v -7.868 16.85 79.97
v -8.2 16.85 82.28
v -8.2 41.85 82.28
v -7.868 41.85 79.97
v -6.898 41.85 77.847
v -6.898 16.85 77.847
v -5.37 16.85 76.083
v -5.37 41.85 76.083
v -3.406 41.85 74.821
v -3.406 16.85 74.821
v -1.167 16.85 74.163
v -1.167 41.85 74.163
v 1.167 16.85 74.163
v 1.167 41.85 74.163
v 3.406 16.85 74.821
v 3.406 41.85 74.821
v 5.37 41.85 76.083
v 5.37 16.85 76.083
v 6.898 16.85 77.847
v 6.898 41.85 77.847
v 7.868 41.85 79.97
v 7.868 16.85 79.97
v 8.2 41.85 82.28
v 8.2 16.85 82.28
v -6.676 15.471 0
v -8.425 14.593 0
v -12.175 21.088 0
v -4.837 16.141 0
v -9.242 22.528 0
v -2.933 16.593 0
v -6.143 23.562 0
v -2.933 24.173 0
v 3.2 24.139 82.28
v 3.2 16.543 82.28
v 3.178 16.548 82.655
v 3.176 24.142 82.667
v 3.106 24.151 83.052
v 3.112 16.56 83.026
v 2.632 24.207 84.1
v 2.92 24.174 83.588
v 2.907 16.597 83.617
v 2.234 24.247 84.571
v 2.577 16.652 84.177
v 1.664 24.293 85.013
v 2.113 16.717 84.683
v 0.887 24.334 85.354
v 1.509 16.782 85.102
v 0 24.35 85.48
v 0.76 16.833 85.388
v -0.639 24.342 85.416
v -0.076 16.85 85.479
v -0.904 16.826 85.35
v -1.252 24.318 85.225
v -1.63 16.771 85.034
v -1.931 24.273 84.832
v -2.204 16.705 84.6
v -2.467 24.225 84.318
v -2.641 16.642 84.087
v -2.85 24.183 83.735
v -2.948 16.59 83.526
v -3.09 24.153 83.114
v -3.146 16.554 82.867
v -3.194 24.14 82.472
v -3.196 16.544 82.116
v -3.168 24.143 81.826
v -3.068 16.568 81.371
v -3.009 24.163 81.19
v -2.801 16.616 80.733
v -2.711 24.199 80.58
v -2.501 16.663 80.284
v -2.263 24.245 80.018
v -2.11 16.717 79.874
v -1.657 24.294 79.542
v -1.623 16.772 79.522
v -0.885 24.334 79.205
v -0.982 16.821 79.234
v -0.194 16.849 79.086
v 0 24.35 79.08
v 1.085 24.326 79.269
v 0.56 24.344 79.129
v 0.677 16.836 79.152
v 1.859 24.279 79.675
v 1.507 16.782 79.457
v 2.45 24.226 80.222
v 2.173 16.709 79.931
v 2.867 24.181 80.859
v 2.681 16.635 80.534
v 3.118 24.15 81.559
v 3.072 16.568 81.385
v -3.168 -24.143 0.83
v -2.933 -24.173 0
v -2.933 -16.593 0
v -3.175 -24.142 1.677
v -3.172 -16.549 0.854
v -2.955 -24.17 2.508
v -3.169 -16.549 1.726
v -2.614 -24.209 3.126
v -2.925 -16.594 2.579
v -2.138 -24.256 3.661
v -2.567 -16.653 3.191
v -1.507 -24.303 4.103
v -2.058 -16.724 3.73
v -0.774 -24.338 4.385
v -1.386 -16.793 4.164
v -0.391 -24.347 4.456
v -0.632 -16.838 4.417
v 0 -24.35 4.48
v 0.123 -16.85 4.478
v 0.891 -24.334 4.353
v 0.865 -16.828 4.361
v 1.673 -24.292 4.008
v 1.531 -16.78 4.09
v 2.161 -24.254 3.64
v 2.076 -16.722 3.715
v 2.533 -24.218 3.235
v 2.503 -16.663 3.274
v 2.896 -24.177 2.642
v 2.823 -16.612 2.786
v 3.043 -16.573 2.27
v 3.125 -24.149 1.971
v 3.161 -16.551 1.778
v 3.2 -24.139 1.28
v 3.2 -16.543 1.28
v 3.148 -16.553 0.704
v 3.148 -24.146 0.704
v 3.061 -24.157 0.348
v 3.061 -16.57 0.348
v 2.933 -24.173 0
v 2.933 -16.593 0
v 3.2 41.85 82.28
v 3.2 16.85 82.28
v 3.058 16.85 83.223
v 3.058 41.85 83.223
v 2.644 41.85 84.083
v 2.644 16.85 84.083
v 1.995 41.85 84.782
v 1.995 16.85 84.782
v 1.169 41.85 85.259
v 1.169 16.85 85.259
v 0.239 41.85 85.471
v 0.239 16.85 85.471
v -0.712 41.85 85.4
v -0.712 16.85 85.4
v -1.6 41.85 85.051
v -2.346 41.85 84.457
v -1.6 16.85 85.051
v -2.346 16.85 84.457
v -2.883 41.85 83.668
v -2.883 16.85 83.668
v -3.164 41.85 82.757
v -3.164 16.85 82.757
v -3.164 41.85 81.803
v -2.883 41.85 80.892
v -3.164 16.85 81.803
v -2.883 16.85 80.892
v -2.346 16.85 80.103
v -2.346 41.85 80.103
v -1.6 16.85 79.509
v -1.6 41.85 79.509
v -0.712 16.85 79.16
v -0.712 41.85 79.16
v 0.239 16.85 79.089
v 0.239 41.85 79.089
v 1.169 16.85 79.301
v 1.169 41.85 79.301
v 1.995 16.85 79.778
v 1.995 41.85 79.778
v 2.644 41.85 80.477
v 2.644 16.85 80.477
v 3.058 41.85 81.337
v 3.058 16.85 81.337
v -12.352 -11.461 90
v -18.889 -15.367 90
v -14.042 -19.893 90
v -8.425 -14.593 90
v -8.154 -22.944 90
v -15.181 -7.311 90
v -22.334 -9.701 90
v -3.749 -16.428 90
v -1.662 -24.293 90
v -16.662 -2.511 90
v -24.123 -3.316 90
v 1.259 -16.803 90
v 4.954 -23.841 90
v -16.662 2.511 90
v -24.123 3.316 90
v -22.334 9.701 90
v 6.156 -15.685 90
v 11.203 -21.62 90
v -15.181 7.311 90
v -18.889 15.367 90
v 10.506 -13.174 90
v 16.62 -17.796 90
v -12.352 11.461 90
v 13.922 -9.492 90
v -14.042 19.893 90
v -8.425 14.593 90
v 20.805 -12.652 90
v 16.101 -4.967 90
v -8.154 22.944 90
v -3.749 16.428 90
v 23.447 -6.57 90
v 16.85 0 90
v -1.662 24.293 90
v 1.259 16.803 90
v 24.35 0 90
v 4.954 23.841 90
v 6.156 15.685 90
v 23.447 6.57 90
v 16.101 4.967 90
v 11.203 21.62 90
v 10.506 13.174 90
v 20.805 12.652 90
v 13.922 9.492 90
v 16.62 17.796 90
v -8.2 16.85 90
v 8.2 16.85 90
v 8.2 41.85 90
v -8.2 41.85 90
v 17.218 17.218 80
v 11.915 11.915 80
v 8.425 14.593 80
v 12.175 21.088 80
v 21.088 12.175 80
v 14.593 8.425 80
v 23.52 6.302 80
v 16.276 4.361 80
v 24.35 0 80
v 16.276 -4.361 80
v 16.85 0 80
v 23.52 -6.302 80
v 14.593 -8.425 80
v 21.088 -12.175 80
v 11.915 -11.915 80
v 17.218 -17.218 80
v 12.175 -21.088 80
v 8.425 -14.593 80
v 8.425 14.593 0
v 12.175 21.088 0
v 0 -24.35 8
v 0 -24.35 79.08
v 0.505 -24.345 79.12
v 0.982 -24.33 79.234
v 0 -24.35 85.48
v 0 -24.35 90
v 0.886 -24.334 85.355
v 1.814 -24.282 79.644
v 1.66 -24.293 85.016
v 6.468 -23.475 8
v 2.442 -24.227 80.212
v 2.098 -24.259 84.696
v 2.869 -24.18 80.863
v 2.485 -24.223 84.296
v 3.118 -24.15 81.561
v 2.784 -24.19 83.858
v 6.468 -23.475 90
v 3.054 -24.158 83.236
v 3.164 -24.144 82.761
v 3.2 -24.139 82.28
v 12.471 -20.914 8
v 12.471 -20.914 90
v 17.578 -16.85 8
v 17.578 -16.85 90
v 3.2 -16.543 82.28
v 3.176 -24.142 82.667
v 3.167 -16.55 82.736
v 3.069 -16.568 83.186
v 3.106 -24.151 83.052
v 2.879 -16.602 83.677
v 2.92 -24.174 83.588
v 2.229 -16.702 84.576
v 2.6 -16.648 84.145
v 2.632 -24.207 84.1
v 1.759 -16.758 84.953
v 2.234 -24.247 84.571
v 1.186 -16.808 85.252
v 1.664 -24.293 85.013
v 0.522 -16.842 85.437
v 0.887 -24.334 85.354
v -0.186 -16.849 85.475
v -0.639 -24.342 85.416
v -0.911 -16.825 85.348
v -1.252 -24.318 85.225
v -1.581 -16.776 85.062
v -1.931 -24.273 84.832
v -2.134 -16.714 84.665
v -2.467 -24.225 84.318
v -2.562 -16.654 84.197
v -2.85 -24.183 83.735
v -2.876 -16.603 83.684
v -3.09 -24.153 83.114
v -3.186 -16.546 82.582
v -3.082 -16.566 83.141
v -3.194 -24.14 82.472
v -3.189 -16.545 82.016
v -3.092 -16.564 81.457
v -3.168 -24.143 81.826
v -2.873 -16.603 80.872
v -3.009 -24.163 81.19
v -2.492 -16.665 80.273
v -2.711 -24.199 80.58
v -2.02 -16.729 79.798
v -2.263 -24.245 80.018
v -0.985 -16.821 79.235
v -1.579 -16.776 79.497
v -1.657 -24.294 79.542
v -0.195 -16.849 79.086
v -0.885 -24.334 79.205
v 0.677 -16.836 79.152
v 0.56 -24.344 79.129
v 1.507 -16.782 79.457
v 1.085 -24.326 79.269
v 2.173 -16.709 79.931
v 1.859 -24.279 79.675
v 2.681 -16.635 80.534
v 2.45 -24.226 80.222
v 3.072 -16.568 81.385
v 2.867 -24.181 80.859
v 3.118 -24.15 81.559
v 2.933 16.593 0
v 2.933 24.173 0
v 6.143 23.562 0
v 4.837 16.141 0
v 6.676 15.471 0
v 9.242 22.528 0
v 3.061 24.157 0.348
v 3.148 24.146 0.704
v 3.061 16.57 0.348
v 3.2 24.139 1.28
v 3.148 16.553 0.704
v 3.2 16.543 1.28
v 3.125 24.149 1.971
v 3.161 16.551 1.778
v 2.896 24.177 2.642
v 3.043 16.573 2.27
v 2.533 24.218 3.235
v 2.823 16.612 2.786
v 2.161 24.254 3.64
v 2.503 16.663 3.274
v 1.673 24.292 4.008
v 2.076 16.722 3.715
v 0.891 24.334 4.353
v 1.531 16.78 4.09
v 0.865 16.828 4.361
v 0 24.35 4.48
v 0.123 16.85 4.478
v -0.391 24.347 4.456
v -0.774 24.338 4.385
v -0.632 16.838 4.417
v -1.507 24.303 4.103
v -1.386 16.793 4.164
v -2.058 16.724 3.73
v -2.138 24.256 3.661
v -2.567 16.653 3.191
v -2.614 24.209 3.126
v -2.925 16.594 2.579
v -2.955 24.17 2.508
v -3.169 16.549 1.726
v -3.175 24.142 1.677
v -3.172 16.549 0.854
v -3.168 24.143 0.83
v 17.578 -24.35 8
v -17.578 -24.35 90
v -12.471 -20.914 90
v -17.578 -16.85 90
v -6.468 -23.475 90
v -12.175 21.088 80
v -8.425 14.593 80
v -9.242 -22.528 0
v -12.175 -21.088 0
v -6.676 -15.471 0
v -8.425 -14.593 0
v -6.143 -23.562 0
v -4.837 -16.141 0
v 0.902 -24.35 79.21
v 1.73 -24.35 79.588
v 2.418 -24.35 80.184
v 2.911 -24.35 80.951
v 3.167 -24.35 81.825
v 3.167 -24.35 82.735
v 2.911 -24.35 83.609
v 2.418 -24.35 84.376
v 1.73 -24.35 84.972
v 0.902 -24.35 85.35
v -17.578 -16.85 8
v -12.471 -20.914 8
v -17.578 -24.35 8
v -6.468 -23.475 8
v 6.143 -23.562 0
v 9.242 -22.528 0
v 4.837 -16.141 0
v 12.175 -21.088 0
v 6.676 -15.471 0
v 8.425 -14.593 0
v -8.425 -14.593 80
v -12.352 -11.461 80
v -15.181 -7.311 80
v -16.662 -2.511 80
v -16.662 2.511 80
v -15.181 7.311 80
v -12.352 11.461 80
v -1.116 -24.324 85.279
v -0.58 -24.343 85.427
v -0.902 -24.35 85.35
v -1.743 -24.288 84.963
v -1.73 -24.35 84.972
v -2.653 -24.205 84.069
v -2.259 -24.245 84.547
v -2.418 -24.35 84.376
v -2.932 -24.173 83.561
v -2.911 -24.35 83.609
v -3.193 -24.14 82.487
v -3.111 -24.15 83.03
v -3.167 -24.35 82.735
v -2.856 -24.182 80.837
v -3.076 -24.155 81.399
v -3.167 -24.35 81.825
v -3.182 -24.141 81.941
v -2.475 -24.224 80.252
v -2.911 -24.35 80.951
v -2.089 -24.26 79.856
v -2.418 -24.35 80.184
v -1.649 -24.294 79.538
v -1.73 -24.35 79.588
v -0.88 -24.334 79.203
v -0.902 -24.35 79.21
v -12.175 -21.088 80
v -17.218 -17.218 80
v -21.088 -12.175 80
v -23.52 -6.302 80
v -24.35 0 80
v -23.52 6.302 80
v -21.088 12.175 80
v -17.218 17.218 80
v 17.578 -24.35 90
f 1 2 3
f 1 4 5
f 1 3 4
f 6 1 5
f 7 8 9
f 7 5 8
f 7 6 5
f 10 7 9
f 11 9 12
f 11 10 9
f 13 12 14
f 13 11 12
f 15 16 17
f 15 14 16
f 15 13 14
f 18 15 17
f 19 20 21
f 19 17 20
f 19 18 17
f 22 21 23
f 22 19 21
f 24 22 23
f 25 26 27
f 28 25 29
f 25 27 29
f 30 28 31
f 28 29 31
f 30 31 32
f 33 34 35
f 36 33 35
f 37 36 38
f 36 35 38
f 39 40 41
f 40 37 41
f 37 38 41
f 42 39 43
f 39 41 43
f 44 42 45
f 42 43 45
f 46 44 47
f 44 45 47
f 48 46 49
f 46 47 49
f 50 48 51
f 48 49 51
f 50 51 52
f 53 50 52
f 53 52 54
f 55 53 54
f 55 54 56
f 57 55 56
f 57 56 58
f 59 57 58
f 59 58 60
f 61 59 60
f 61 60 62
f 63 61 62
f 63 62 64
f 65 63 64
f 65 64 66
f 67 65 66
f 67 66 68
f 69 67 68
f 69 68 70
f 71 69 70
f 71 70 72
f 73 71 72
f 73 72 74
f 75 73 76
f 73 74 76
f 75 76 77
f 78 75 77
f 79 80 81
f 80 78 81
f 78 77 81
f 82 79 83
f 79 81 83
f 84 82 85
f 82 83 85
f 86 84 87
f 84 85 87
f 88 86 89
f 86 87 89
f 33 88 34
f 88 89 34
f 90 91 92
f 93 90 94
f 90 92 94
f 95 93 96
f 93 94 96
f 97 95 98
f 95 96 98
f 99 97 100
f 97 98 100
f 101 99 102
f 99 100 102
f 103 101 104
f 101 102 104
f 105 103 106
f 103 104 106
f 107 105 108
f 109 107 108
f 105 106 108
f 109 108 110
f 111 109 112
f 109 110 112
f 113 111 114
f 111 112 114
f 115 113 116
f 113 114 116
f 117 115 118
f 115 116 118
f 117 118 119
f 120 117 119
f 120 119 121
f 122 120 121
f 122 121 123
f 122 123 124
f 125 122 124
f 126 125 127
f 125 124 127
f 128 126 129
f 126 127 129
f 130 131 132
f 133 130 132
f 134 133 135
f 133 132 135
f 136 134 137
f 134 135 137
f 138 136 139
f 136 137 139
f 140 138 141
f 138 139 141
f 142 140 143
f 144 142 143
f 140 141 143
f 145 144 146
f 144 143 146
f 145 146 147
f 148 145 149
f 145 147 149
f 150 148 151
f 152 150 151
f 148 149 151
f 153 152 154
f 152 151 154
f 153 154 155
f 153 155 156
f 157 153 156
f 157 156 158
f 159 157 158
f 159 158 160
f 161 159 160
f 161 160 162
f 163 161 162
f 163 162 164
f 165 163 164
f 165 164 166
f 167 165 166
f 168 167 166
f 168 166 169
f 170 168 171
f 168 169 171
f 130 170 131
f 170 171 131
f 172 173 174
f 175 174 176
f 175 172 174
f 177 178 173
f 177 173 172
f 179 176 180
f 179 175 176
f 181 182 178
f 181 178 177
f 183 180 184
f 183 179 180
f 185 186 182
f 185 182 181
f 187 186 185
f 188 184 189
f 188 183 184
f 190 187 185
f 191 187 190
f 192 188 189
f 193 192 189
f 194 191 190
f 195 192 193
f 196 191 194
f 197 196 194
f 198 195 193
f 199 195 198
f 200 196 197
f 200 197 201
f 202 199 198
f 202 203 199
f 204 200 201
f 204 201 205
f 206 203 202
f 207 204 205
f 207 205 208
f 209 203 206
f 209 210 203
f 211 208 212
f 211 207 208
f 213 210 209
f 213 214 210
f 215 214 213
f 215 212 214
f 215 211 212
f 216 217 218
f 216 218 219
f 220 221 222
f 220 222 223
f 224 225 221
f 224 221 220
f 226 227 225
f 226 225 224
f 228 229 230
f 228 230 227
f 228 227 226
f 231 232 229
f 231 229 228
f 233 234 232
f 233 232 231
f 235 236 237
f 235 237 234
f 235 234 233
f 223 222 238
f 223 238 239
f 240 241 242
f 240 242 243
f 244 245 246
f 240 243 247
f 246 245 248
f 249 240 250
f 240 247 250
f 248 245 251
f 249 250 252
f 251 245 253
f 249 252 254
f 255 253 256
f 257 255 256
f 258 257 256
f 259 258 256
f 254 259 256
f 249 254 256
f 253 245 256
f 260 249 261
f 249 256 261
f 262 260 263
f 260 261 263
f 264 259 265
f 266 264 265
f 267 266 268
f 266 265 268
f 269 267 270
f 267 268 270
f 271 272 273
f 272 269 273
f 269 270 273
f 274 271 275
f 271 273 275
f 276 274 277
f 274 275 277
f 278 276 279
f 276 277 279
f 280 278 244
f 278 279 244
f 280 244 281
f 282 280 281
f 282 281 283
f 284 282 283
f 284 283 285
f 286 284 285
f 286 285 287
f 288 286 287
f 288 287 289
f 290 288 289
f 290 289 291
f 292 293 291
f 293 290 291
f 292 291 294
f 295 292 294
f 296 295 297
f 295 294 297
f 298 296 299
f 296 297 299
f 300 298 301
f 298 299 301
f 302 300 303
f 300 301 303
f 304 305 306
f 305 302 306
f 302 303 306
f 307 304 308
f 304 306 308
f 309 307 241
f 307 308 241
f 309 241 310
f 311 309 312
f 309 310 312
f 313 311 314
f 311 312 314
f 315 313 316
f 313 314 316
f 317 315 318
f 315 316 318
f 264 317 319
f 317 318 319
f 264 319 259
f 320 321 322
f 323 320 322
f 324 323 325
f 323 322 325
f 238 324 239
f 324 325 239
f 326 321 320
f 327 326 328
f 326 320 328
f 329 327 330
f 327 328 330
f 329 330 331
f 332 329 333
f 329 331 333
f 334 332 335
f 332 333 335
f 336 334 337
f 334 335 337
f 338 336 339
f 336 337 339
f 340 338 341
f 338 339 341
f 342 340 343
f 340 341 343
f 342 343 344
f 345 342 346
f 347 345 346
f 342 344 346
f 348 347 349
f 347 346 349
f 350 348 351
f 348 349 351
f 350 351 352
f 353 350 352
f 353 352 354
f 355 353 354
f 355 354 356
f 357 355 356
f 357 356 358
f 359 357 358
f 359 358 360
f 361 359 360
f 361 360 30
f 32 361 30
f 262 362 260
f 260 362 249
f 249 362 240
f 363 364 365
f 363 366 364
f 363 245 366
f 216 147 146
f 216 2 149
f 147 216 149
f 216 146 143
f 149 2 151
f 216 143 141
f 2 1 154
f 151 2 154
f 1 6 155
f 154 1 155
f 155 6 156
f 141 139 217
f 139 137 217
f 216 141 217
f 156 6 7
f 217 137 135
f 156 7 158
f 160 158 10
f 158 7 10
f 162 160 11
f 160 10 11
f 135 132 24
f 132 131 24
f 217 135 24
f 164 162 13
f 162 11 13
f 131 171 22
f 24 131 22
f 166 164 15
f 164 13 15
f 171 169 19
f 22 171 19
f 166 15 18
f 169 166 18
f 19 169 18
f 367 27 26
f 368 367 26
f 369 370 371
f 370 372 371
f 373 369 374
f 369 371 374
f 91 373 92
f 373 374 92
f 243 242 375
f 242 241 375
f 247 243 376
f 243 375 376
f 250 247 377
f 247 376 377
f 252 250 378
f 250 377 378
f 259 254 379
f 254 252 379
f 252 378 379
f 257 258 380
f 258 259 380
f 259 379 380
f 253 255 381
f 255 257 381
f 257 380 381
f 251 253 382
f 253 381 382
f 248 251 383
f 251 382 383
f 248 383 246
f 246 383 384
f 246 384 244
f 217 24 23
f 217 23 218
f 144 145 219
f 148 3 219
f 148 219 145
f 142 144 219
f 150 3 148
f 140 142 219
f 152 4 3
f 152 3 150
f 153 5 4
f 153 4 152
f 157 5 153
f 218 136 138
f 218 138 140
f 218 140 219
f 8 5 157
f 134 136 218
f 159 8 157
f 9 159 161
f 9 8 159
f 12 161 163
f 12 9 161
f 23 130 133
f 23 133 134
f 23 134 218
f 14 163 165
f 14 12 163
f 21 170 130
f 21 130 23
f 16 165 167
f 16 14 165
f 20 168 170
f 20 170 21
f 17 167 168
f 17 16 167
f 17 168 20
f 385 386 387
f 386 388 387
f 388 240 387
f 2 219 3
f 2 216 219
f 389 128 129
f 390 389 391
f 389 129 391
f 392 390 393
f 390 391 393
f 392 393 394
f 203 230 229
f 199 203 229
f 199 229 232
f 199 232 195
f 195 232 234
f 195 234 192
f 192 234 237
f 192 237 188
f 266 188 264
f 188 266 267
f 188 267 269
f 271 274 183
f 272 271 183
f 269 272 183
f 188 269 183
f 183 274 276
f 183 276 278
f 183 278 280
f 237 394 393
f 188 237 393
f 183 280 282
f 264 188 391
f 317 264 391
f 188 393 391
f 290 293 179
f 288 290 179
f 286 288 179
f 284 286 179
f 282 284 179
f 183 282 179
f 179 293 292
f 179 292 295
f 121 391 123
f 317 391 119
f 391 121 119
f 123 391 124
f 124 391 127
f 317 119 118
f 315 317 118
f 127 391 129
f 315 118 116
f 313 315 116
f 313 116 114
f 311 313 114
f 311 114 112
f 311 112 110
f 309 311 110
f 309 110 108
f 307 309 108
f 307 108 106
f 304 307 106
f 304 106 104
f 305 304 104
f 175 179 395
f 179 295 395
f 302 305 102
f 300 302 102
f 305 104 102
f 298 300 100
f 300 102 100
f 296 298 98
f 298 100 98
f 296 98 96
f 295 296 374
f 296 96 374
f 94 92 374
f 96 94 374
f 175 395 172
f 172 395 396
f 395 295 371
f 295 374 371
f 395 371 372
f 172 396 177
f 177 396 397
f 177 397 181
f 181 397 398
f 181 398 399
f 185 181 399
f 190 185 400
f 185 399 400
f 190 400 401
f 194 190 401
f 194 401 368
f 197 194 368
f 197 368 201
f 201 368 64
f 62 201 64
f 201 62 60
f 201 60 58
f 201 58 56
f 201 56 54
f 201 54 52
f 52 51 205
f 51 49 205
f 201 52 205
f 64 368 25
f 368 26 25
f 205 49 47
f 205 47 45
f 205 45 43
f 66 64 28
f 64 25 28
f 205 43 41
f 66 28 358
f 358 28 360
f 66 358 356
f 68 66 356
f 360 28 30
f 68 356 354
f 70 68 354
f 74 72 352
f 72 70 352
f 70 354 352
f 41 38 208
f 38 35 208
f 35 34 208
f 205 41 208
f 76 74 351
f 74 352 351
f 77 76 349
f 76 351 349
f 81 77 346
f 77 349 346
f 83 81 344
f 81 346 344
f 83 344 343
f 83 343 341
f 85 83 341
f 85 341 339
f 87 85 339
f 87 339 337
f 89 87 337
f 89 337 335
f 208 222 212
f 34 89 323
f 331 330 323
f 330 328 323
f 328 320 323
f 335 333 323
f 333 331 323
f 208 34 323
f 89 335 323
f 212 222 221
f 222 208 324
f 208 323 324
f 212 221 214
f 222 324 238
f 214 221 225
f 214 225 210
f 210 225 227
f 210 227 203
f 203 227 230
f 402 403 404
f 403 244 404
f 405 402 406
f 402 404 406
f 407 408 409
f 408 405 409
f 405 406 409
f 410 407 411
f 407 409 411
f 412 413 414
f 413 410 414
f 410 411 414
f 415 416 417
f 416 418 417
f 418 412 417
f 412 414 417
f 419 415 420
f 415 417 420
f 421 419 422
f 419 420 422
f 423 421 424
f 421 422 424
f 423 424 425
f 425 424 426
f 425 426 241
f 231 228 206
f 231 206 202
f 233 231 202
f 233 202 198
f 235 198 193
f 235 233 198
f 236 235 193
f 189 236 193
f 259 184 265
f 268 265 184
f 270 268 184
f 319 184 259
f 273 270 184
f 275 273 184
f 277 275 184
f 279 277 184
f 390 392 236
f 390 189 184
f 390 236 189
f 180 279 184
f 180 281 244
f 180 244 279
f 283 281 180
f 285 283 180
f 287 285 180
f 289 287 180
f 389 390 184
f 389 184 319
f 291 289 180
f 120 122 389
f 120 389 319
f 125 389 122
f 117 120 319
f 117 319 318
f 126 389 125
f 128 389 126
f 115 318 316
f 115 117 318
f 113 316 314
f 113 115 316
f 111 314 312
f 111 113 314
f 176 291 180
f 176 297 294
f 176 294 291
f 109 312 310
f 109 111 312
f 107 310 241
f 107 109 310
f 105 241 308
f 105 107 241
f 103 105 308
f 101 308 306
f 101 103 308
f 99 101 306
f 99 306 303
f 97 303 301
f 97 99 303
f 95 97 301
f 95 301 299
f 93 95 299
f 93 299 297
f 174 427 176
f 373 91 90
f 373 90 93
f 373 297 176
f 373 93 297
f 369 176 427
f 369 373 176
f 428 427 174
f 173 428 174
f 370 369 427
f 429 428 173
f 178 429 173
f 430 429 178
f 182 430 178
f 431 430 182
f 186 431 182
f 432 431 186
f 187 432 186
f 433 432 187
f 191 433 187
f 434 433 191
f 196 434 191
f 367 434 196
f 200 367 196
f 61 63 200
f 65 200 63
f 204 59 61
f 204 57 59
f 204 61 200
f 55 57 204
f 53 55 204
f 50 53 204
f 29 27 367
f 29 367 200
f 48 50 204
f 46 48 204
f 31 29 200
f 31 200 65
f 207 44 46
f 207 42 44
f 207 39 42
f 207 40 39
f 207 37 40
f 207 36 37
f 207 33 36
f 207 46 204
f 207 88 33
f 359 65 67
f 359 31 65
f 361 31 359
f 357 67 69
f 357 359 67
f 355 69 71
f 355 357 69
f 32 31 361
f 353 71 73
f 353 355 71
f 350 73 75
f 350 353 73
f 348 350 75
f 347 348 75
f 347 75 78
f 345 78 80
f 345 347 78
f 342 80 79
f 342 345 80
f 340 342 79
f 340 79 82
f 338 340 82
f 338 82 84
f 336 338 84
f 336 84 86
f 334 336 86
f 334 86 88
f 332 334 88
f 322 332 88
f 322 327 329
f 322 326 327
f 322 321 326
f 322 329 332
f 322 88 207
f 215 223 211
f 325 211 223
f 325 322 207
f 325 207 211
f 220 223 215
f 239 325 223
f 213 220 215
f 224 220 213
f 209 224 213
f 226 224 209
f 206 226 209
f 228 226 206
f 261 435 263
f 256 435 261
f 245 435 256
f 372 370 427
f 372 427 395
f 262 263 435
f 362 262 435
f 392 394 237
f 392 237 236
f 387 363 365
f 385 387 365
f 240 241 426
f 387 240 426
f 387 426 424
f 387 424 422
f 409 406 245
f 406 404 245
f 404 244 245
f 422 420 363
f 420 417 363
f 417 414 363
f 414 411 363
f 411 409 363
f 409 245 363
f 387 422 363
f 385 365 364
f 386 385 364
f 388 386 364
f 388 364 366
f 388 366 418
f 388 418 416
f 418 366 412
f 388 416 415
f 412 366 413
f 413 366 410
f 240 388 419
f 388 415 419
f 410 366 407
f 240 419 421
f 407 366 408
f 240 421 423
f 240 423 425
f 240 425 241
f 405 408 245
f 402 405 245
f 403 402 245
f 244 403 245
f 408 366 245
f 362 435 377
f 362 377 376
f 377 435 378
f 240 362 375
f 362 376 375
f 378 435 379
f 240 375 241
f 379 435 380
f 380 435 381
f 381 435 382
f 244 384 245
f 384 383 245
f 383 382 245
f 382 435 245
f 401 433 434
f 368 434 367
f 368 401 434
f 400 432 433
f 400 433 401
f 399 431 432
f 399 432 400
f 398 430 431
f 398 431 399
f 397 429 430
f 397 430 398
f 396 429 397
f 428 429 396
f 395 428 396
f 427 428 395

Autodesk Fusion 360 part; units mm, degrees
sketch "Main Body" plane through (0, 0, 0) normal (0, 0, 1) x (1, 0, 0)
  circle A0 centre (0, 0) radius 16.85
  circle A1 centre (0, 0) radius 24.35
  dimension "d1" = 33.7
  dimension "d2" = 48.7
extrude "Extrude1" add sketch "Main Body" along normal blind 90 makes body 1
sketch "Cut Guide" plane through (0, 0, 0) normal (0, 1, 0) x (1, 0, 0)
  circle A0 centre (0, -1.28) radius 3.2
  circle A1 centre (0, -82.28) radius 3.2
  circle A2 centre (0, -82.28) radius 8.2
  line L0 (-8.2, -82.28) -> (8.2, -82.28)
  line L1 (8.2, -82.28) -> (8.2, -90)
  line L2 (8.2, -90) -> (-8.2, -90)
  line L3 (-8.2, -90) -> (-8.2, -82.28)
  point P0 (0, -41.6319)
  dimension "d5" = 6.4
  dimension "d6" = 1.28
  dimension "d11" = 6.4
  dimension "d12" = 81
  dimension "d13" = 16.4
  dimension "d33" = 7.72
extrude "Extrude2" cut sketch "Cut Guide" along normal blind 24.35 and the other way blind 24.35 contours A0 bodies 1
extrude "Extrude3" add sketch "Cut Guide" along normal blind 25 from surface at 16.85 separate body contours A1 A2 L0 L2 | A1 A2 L0 | A2 L1 L2 | A2 L2 L3 makes body 2
sketch "Side Removal" plane through (0, 0, 0) normal (0, 0, -1) x (1, 0, 0)
  line L0 (-2.9328, 16.5928) -> (-2.9328, 24.1727)
  arc A0 (-2.9328, 24.1727) -> (-2.9328, -24.1727) centre (0, 0) ccw
  line L1 (-2.9328, -24.1727) -> (-2.9328, -16.5928)
  arc A1 (-2.9328, 16.5928) -> (-2.9328, -16.5928) centre (0, 0) ccw
  line L2 (-12.175, -21.0877) -> (12.175, 21.0877)
  arc A2 (2.9328, -24.1727) -> (2.9328, 24.1727) centre (0, 0) ccw
  line L3 (-12.175, 21.0877) -> (12.175, -21.0877)
  dimension "d19" = 120
extrude "Extrude4" cut sketch "Side Removal" against normal blind 80 contours L2 A2 L3 | A1 L2 L3 | A0 A1 L2 L3 bodies 1
sketch "Flat Bottom" plane through (0, 0, 90) normal (0, 0, 1) x (-1, 0, 0)
  circle A0 centre (0, 0) radius 16.85
  circle A1 centre (0, 0) radius 24.35
  line L0 (17.5784, 16.85) -> (-17.5784, 16.85)
  line L1 (-17.5784, 16.85) -> (-17.5784, 24.35)
  line L2 (-17.5784, 24.35) -> (17.5784, 24.35)
  line L3 (17.5784, 24.35) -> (17.5784, 16.85)
extrude "Extrude6" add sketch "Flat Bottom" against normal blind 82 separate body contours A1 L2 L3 | A1 L1 L2 makes body 3 at (-13.3955, -20.3343, 35.3333)
extrude "Extrude7" cut sketch "Cut Guide" along normal blind 24.35 and the other way blind 24.35 contours A1 L0 | A1 L0 bodies 1 3
equation "d2 = d1 + 15 mm"
equation "d3 = 90 mm"
equation "d6 = d5 / 5"
equation "d7 = d2 / 2"
equation "d9 = d2 / 2"
equation "d13 = d11 + 10 mm"
equation "d16 = ( d1 ) / 2"
equation "d21 = -( d3 - 10 mm )"
equation "d27 = -d3 + 8 mm"
equation "d29 = d2 / 2"
equation "d31 = d2 / 2"
equation "d33 = d3 - d12 - d6"
